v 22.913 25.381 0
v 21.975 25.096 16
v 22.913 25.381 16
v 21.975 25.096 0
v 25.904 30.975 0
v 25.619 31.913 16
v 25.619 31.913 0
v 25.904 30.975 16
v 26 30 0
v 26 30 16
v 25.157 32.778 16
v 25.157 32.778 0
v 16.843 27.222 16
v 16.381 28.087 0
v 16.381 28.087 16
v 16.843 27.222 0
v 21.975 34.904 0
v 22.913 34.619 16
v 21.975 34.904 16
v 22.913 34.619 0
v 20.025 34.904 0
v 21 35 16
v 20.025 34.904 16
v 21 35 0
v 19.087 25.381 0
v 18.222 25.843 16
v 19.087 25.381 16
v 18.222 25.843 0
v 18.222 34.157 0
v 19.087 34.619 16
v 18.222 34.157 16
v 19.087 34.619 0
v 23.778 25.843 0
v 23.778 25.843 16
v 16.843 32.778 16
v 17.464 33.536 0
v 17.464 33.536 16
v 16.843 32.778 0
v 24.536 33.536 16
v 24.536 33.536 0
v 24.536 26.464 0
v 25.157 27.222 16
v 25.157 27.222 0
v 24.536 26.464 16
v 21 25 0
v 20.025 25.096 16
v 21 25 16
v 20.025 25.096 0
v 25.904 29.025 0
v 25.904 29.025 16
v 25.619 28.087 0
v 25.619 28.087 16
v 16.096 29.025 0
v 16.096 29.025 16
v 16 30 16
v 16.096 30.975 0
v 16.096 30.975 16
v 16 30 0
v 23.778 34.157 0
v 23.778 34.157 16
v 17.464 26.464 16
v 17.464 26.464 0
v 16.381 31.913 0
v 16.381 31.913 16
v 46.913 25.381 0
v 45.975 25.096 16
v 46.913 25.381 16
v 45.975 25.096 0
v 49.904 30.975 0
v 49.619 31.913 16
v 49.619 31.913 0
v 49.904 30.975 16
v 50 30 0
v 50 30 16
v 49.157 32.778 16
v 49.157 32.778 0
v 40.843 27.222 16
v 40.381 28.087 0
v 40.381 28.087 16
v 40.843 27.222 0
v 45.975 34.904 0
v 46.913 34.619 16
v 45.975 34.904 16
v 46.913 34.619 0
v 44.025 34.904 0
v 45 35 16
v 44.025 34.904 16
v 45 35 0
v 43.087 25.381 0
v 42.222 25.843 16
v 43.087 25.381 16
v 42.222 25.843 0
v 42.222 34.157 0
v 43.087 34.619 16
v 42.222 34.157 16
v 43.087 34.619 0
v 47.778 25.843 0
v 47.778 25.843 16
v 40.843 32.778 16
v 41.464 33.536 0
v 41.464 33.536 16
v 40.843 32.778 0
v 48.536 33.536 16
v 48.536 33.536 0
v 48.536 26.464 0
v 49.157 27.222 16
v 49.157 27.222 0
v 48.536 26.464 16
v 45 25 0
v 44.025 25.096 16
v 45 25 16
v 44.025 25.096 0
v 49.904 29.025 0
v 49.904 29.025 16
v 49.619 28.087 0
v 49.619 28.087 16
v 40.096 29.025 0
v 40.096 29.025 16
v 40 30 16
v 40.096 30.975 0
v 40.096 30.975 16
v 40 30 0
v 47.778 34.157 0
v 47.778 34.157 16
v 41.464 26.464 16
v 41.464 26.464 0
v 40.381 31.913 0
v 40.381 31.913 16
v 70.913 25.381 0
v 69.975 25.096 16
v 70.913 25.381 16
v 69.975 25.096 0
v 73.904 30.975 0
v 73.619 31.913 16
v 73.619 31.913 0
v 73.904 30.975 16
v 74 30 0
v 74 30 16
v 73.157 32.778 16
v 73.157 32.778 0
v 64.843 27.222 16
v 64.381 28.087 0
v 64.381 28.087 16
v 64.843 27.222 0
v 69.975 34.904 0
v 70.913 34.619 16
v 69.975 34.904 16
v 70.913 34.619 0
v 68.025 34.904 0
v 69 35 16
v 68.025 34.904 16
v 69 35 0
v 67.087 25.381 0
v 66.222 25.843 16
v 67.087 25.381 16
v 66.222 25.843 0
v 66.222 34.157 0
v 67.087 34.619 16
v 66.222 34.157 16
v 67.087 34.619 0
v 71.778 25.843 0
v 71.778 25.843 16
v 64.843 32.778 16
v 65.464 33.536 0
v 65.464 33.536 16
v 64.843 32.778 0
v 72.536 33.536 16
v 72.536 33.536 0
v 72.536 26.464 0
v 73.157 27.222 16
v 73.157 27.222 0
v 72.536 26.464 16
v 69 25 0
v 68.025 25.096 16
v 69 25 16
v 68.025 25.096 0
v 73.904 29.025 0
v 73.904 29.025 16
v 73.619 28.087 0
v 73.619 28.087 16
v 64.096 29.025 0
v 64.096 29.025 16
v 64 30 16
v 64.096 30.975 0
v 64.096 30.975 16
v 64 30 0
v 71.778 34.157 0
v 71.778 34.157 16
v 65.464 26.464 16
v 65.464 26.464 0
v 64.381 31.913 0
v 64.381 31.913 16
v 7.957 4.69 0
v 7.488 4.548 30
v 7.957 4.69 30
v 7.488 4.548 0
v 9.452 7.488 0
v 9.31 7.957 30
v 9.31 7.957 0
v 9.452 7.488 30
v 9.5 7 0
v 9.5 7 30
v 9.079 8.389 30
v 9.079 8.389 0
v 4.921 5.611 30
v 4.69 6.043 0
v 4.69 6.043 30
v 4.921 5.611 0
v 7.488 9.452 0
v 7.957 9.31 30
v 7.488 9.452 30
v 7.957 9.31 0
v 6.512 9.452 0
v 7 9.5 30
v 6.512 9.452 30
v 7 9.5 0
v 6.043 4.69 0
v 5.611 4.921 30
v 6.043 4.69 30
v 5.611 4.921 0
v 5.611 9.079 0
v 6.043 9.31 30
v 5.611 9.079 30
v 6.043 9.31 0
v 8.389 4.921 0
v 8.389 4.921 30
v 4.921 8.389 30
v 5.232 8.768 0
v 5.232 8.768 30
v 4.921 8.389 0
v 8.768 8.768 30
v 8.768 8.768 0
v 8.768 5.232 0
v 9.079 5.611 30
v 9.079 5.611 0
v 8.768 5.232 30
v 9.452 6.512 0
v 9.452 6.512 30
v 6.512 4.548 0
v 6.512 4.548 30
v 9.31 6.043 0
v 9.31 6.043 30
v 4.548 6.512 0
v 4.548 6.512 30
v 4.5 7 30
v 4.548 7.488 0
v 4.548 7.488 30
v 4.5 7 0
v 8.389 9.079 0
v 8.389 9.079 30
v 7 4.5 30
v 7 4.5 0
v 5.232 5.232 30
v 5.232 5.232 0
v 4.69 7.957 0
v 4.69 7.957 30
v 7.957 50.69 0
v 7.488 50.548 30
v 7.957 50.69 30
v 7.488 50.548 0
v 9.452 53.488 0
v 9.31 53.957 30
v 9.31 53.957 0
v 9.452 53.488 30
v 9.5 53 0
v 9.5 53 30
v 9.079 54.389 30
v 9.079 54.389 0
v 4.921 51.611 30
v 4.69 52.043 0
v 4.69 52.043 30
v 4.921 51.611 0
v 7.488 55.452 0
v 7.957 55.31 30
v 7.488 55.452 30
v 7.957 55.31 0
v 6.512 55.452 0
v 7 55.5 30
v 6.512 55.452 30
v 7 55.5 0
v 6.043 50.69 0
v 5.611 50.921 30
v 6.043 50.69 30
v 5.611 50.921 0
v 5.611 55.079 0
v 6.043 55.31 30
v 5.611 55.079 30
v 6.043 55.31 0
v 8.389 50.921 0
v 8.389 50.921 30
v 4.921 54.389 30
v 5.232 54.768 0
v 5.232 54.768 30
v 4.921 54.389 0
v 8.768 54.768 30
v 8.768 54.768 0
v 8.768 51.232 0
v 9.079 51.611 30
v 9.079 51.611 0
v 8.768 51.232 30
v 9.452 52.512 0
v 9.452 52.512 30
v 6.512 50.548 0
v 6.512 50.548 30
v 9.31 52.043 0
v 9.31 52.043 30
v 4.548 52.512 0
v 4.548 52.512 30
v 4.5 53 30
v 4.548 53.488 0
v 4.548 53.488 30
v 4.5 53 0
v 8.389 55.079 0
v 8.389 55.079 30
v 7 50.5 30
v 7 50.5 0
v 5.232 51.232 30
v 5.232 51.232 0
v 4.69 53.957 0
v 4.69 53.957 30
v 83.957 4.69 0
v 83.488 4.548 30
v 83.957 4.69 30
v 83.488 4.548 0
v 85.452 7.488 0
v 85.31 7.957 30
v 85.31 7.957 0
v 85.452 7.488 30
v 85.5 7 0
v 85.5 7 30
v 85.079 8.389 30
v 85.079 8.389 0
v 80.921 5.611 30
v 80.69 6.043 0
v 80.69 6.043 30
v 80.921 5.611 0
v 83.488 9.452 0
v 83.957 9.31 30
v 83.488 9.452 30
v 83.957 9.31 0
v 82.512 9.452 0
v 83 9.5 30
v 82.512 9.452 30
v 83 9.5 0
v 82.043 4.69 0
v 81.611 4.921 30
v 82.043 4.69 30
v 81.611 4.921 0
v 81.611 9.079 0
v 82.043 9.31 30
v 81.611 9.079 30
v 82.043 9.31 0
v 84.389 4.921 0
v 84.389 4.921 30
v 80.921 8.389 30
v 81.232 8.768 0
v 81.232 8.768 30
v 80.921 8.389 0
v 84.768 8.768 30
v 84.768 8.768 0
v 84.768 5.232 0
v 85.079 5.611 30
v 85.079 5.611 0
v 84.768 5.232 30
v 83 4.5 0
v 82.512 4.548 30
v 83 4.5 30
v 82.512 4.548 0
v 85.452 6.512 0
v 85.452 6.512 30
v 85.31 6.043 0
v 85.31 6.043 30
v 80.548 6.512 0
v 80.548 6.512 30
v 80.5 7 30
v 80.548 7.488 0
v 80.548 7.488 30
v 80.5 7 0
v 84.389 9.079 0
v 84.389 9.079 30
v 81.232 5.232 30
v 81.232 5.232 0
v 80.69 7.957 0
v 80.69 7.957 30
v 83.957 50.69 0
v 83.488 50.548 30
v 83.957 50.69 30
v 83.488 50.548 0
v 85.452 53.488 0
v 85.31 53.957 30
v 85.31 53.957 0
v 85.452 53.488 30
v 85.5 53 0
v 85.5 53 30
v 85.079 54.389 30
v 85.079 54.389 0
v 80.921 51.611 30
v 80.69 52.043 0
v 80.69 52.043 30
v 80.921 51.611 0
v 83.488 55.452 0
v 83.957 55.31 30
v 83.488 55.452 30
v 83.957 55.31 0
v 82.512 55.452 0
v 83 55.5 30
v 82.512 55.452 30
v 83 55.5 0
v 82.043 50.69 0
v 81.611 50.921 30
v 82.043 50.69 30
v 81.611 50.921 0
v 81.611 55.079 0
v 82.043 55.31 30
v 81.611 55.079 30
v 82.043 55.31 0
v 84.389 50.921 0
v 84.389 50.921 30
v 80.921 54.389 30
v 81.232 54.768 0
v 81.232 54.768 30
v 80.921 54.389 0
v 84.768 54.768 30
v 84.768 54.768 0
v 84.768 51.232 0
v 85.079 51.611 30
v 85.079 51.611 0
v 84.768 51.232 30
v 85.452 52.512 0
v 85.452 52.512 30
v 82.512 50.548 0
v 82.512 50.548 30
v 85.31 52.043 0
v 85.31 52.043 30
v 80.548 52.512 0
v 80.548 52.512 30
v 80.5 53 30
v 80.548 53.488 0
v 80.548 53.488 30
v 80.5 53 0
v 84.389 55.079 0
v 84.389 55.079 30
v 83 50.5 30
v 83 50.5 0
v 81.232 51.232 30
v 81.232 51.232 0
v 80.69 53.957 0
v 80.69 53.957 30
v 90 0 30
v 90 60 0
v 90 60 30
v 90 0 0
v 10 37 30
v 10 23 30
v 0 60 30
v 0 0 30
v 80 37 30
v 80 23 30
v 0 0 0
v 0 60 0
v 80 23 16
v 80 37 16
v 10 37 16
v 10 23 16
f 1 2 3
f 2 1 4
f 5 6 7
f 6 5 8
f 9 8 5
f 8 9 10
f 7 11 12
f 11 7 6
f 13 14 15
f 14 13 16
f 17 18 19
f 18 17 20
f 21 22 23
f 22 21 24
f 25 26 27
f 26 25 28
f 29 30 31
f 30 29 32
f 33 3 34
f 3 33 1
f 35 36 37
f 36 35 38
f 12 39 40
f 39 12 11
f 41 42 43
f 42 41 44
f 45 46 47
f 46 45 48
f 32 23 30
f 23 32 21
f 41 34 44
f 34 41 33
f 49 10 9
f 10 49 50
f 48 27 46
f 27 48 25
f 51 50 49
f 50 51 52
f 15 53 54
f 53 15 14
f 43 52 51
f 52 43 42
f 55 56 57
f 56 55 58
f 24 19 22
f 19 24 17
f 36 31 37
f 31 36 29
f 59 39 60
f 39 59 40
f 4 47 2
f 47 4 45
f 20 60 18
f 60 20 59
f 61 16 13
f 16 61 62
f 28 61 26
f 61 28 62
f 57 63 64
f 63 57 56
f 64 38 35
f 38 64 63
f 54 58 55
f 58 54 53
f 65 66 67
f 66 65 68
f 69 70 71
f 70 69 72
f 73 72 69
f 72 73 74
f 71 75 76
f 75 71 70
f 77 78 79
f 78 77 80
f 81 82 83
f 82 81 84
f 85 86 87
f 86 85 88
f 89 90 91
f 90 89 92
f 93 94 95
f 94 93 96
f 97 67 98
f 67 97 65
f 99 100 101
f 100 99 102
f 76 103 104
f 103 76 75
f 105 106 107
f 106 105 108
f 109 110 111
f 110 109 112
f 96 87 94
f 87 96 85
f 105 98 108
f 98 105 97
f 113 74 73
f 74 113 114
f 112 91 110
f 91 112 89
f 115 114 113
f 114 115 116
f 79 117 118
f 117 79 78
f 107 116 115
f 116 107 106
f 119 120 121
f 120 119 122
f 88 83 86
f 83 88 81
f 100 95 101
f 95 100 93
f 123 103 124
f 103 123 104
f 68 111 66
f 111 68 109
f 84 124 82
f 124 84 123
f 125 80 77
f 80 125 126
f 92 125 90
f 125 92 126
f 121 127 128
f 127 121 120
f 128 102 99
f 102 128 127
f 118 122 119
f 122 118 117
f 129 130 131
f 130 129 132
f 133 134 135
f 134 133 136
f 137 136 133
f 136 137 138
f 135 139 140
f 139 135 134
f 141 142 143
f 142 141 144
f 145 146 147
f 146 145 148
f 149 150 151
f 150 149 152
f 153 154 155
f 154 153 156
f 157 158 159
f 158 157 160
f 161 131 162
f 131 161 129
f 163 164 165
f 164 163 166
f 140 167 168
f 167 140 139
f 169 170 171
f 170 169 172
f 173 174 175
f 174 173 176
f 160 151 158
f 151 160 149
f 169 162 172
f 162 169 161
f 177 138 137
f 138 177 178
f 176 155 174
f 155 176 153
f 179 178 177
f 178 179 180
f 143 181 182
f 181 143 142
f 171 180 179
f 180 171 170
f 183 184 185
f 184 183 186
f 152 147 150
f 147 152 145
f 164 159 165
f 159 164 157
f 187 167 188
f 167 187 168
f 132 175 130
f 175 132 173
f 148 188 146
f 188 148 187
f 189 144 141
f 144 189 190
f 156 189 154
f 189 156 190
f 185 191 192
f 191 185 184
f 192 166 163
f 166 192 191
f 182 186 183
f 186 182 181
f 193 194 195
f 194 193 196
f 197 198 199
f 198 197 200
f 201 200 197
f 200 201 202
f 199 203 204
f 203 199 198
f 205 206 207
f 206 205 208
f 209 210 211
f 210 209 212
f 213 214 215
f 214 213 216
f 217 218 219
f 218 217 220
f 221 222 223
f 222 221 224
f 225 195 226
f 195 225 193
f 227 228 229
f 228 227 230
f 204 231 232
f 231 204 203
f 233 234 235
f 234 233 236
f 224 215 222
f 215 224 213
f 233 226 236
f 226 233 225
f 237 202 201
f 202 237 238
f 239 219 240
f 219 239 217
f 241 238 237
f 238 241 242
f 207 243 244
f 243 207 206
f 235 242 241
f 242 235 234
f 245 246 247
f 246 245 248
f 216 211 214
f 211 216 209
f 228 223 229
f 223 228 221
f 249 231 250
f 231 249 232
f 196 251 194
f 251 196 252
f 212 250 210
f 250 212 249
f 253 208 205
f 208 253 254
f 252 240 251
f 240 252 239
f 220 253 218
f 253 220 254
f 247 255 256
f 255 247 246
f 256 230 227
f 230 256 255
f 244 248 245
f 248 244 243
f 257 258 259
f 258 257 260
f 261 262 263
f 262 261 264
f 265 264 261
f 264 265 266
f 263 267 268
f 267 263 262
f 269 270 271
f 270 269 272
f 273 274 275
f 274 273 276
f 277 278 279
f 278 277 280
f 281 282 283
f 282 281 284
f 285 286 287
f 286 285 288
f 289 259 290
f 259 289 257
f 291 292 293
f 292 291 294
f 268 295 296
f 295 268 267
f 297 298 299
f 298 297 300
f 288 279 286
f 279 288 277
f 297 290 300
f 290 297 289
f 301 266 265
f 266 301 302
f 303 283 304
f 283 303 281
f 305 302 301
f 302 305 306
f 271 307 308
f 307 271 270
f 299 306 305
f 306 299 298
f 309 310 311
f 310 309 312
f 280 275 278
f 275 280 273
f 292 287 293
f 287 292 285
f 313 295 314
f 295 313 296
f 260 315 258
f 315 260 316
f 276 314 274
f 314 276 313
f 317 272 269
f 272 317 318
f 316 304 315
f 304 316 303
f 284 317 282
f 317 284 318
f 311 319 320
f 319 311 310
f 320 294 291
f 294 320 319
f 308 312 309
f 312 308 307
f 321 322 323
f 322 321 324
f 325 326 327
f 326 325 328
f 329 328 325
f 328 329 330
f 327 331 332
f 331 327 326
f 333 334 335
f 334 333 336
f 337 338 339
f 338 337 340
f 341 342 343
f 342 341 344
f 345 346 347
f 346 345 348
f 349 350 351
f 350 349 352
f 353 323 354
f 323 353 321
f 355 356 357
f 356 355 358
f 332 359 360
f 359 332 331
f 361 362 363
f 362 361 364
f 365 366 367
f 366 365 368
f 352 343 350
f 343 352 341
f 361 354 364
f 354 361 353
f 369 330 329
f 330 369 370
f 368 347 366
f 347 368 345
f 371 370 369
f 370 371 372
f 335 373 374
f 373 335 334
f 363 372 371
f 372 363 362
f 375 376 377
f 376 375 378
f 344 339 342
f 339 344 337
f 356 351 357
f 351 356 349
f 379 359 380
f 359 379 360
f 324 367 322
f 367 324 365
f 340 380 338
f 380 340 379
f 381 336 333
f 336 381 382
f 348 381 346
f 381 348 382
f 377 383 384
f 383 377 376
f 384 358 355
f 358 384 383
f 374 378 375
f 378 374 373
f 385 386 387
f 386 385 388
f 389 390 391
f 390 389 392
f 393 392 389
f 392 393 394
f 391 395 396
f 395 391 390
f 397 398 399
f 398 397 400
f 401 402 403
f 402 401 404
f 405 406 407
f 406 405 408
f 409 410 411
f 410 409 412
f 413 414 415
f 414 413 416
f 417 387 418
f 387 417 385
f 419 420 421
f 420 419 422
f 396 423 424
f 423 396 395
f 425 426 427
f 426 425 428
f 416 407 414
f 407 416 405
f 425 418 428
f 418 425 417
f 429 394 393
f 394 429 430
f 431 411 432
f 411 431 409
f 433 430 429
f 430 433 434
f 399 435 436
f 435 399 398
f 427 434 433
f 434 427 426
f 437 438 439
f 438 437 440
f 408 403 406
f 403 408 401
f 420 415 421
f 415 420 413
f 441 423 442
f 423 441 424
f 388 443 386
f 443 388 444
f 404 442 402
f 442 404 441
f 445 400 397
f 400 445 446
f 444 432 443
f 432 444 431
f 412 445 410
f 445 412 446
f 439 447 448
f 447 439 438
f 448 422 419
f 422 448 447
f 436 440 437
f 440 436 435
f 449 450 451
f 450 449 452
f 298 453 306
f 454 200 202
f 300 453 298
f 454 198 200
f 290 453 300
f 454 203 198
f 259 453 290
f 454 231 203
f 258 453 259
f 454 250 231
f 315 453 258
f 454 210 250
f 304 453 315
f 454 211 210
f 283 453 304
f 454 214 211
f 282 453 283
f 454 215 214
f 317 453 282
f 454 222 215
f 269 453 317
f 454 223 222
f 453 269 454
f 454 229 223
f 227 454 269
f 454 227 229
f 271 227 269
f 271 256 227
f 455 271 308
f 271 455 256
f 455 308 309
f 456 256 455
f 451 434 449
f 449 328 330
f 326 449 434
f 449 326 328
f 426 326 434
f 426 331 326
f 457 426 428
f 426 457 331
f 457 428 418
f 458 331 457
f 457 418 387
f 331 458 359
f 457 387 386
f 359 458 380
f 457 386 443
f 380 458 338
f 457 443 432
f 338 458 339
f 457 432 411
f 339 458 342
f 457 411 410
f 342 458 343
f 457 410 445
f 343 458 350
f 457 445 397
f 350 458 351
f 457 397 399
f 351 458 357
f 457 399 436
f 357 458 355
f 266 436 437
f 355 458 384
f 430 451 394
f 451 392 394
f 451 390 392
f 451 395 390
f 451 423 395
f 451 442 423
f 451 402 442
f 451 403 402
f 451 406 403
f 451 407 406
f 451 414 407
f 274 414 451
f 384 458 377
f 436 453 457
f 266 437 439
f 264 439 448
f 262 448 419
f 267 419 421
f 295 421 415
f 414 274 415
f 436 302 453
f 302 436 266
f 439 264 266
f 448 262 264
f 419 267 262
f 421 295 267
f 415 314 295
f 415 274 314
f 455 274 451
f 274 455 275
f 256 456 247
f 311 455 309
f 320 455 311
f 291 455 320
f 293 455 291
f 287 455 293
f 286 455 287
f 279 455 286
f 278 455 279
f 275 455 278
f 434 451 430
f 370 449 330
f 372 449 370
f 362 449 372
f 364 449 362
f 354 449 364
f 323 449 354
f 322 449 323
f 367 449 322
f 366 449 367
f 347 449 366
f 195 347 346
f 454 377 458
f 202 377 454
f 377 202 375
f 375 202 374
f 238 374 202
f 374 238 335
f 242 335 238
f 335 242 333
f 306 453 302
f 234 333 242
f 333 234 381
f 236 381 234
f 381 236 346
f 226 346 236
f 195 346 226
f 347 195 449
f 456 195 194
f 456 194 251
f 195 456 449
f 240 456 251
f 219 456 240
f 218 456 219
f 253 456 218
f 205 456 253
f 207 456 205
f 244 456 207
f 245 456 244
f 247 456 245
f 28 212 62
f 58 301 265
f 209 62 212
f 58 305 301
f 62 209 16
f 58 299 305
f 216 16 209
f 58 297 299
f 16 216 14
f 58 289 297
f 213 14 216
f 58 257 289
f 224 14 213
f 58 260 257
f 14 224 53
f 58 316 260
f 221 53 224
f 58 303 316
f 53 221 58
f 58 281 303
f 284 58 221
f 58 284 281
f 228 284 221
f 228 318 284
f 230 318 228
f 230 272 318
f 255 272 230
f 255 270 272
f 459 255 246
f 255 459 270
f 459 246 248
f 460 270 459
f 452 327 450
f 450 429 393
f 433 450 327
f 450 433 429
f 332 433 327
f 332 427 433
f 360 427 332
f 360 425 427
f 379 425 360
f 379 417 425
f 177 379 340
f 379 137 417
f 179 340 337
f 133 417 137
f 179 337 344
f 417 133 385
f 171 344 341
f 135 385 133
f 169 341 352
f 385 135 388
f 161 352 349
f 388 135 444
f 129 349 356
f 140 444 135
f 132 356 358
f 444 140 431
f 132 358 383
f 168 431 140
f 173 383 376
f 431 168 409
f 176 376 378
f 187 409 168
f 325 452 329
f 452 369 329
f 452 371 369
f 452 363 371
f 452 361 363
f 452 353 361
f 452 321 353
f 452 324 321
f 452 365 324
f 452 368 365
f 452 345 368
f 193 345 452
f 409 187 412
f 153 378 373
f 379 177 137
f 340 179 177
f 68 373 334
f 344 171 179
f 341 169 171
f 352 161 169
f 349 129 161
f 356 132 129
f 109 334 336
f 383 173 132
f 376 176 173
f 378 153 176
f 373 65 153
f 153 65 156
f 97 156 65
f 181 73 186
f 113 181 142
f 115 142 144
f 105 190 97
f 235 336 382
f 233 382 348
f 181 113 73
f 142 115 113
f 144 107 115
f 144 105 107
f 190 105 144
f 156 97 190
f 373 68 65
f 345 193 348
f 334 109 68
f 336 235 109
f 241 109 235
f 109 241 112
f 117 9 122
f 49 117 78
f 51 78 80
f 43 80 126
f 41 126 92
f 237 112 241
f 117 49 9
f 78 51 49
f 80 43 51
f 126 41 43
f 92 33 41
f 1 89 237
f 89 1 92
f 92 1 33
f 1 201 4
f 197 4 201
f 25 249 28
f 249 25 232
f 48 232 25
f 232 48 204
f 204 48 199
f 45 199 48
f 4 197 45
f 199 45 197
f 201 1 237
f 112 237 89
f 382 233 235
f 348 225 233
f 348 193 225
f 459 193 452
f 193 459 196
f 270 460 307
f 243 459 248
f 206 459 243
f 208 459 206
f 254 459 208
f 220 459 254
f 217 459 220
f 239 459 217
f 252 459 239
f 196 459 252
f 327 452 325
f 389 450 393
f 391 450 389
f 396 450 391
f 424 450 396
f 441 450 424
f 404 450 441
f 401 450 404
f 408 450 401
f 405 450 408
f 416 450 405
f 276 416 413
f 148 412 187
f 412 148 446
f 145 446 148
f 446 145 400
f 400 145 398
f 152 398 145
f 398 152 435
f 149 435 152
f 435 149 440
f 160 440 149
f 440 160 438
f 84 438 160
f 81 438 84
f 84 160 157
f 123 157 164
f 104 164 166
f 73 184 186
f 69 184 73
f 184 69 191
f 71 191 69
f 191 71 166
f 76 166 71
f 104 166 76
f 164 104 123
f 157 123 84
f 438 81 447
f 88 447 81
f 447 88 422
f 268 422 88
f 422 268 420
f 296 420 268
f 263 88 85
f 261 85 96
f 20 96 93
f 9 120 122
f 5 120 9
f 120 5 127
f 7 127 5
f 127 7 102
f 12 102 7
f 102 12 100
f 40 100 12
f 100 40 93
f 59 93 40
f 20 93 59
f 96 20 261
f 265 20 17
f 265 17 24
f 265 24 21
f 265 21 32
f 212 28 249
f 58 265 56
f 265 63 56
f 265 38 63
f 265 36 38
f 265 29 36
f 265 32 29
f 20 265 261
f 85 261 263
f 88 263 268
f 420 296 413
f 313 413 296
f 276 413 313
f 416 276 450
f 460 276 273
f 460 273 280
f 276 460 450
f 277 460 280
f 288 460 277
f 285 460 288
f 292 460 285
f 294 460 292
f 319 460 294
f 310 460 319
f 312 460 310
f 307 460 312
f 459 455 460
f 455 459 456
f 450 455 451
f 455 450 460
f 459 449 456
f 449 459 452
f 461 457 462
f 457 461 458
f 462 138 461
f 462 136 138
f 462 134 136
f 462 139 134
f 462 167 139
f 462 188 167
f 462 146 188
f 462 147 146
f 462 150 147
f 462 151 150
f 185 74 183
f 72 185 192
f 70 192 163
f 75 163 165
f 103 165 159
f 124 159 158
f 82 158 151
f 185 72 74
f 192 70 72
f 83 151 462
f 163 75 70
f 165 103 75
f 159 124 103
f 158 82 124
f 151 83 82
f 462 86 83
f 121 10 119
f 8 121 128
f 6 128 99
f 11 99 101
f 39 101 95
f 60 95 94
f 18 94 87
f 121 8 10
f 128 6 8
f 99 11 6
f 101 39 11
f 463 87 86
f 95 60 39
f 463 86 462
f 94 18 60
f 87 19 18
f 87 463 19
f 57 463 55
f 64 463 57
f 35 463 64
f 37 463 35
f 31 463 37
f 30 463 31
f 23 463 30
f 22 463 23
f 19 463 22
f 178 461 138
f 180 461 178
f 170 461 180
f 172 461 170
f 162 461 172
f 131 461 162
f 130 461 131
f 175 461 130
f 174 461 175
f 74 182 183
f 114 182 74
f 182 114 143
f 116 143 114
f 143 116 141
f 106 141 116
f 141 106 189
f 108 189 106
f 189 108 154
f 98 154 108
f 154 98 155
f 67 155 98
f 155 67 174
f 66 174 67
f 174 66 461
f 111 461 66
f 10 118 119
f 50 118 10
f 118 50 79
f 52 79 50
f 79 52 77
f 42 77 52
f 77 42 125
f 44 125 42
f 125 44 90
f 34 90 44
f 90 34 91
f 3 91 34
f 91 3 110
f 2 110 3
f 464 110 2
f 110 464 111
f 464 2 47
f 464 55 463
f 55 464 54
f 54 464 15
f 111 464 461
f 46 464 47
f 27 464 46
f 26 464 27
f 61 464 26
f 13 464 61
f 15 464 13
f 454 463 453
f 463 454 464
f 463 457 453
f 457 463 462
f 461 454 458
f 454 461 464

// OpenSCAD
$fn = 32;

// ----------------------------------------------------------------------
// Manifold block: gallery_top manifold
// ----------------------------------------------------------------------

// --- parameters (mm) ---
block_l = 90;             // block length, X
block_w = 60;             // block width, Y
block_h = 30;             // block height, Z
port_d = 10;              // port bore diameter
port_pitch = 24;          // port pitch along X
gallery_d = 14;           // top gallery width, Y
gallery_depth = 14;       // gallery pocket depth
wall_p = 10;              // gallery end wall thickness, X
mnt_d = 5;                // mounting hole diameter
mnt_in = 7;               // mounting hole inset from the edges
fit_tol = 0.05;           // tolerance for press fits, mm
free_tol = 0.3;           // tolerance for clearance fits, mm

n_ports = 3;  // ports in the row
port_x0 = (block_l - (n_ports - 1) * port_pitch) / 2;  // first port X

difference() {
  cube([block_l, block_w, block_h]);
  for (i = [0 : n_ports - 1])
    translate([port_x0 + i * port_pitch, block_w / 2, -1])
      cylinder(h = block_h + 2, d = port_d);
  translate([wall_p, block_w / 2 - gallery_d / 2, block_h - gallery_depth])
    cube([block_l - 2 * wall_p, gallery_d, gallery_depth + 1]);
  for (cx = [mnt_in, block_l - mnt_in])
    for (cy = [mnt_in, block_w - mnt_in])
      translate([cx, cy, -1]) cylinder(h = block_h + 2, d = mnt_d);
}
